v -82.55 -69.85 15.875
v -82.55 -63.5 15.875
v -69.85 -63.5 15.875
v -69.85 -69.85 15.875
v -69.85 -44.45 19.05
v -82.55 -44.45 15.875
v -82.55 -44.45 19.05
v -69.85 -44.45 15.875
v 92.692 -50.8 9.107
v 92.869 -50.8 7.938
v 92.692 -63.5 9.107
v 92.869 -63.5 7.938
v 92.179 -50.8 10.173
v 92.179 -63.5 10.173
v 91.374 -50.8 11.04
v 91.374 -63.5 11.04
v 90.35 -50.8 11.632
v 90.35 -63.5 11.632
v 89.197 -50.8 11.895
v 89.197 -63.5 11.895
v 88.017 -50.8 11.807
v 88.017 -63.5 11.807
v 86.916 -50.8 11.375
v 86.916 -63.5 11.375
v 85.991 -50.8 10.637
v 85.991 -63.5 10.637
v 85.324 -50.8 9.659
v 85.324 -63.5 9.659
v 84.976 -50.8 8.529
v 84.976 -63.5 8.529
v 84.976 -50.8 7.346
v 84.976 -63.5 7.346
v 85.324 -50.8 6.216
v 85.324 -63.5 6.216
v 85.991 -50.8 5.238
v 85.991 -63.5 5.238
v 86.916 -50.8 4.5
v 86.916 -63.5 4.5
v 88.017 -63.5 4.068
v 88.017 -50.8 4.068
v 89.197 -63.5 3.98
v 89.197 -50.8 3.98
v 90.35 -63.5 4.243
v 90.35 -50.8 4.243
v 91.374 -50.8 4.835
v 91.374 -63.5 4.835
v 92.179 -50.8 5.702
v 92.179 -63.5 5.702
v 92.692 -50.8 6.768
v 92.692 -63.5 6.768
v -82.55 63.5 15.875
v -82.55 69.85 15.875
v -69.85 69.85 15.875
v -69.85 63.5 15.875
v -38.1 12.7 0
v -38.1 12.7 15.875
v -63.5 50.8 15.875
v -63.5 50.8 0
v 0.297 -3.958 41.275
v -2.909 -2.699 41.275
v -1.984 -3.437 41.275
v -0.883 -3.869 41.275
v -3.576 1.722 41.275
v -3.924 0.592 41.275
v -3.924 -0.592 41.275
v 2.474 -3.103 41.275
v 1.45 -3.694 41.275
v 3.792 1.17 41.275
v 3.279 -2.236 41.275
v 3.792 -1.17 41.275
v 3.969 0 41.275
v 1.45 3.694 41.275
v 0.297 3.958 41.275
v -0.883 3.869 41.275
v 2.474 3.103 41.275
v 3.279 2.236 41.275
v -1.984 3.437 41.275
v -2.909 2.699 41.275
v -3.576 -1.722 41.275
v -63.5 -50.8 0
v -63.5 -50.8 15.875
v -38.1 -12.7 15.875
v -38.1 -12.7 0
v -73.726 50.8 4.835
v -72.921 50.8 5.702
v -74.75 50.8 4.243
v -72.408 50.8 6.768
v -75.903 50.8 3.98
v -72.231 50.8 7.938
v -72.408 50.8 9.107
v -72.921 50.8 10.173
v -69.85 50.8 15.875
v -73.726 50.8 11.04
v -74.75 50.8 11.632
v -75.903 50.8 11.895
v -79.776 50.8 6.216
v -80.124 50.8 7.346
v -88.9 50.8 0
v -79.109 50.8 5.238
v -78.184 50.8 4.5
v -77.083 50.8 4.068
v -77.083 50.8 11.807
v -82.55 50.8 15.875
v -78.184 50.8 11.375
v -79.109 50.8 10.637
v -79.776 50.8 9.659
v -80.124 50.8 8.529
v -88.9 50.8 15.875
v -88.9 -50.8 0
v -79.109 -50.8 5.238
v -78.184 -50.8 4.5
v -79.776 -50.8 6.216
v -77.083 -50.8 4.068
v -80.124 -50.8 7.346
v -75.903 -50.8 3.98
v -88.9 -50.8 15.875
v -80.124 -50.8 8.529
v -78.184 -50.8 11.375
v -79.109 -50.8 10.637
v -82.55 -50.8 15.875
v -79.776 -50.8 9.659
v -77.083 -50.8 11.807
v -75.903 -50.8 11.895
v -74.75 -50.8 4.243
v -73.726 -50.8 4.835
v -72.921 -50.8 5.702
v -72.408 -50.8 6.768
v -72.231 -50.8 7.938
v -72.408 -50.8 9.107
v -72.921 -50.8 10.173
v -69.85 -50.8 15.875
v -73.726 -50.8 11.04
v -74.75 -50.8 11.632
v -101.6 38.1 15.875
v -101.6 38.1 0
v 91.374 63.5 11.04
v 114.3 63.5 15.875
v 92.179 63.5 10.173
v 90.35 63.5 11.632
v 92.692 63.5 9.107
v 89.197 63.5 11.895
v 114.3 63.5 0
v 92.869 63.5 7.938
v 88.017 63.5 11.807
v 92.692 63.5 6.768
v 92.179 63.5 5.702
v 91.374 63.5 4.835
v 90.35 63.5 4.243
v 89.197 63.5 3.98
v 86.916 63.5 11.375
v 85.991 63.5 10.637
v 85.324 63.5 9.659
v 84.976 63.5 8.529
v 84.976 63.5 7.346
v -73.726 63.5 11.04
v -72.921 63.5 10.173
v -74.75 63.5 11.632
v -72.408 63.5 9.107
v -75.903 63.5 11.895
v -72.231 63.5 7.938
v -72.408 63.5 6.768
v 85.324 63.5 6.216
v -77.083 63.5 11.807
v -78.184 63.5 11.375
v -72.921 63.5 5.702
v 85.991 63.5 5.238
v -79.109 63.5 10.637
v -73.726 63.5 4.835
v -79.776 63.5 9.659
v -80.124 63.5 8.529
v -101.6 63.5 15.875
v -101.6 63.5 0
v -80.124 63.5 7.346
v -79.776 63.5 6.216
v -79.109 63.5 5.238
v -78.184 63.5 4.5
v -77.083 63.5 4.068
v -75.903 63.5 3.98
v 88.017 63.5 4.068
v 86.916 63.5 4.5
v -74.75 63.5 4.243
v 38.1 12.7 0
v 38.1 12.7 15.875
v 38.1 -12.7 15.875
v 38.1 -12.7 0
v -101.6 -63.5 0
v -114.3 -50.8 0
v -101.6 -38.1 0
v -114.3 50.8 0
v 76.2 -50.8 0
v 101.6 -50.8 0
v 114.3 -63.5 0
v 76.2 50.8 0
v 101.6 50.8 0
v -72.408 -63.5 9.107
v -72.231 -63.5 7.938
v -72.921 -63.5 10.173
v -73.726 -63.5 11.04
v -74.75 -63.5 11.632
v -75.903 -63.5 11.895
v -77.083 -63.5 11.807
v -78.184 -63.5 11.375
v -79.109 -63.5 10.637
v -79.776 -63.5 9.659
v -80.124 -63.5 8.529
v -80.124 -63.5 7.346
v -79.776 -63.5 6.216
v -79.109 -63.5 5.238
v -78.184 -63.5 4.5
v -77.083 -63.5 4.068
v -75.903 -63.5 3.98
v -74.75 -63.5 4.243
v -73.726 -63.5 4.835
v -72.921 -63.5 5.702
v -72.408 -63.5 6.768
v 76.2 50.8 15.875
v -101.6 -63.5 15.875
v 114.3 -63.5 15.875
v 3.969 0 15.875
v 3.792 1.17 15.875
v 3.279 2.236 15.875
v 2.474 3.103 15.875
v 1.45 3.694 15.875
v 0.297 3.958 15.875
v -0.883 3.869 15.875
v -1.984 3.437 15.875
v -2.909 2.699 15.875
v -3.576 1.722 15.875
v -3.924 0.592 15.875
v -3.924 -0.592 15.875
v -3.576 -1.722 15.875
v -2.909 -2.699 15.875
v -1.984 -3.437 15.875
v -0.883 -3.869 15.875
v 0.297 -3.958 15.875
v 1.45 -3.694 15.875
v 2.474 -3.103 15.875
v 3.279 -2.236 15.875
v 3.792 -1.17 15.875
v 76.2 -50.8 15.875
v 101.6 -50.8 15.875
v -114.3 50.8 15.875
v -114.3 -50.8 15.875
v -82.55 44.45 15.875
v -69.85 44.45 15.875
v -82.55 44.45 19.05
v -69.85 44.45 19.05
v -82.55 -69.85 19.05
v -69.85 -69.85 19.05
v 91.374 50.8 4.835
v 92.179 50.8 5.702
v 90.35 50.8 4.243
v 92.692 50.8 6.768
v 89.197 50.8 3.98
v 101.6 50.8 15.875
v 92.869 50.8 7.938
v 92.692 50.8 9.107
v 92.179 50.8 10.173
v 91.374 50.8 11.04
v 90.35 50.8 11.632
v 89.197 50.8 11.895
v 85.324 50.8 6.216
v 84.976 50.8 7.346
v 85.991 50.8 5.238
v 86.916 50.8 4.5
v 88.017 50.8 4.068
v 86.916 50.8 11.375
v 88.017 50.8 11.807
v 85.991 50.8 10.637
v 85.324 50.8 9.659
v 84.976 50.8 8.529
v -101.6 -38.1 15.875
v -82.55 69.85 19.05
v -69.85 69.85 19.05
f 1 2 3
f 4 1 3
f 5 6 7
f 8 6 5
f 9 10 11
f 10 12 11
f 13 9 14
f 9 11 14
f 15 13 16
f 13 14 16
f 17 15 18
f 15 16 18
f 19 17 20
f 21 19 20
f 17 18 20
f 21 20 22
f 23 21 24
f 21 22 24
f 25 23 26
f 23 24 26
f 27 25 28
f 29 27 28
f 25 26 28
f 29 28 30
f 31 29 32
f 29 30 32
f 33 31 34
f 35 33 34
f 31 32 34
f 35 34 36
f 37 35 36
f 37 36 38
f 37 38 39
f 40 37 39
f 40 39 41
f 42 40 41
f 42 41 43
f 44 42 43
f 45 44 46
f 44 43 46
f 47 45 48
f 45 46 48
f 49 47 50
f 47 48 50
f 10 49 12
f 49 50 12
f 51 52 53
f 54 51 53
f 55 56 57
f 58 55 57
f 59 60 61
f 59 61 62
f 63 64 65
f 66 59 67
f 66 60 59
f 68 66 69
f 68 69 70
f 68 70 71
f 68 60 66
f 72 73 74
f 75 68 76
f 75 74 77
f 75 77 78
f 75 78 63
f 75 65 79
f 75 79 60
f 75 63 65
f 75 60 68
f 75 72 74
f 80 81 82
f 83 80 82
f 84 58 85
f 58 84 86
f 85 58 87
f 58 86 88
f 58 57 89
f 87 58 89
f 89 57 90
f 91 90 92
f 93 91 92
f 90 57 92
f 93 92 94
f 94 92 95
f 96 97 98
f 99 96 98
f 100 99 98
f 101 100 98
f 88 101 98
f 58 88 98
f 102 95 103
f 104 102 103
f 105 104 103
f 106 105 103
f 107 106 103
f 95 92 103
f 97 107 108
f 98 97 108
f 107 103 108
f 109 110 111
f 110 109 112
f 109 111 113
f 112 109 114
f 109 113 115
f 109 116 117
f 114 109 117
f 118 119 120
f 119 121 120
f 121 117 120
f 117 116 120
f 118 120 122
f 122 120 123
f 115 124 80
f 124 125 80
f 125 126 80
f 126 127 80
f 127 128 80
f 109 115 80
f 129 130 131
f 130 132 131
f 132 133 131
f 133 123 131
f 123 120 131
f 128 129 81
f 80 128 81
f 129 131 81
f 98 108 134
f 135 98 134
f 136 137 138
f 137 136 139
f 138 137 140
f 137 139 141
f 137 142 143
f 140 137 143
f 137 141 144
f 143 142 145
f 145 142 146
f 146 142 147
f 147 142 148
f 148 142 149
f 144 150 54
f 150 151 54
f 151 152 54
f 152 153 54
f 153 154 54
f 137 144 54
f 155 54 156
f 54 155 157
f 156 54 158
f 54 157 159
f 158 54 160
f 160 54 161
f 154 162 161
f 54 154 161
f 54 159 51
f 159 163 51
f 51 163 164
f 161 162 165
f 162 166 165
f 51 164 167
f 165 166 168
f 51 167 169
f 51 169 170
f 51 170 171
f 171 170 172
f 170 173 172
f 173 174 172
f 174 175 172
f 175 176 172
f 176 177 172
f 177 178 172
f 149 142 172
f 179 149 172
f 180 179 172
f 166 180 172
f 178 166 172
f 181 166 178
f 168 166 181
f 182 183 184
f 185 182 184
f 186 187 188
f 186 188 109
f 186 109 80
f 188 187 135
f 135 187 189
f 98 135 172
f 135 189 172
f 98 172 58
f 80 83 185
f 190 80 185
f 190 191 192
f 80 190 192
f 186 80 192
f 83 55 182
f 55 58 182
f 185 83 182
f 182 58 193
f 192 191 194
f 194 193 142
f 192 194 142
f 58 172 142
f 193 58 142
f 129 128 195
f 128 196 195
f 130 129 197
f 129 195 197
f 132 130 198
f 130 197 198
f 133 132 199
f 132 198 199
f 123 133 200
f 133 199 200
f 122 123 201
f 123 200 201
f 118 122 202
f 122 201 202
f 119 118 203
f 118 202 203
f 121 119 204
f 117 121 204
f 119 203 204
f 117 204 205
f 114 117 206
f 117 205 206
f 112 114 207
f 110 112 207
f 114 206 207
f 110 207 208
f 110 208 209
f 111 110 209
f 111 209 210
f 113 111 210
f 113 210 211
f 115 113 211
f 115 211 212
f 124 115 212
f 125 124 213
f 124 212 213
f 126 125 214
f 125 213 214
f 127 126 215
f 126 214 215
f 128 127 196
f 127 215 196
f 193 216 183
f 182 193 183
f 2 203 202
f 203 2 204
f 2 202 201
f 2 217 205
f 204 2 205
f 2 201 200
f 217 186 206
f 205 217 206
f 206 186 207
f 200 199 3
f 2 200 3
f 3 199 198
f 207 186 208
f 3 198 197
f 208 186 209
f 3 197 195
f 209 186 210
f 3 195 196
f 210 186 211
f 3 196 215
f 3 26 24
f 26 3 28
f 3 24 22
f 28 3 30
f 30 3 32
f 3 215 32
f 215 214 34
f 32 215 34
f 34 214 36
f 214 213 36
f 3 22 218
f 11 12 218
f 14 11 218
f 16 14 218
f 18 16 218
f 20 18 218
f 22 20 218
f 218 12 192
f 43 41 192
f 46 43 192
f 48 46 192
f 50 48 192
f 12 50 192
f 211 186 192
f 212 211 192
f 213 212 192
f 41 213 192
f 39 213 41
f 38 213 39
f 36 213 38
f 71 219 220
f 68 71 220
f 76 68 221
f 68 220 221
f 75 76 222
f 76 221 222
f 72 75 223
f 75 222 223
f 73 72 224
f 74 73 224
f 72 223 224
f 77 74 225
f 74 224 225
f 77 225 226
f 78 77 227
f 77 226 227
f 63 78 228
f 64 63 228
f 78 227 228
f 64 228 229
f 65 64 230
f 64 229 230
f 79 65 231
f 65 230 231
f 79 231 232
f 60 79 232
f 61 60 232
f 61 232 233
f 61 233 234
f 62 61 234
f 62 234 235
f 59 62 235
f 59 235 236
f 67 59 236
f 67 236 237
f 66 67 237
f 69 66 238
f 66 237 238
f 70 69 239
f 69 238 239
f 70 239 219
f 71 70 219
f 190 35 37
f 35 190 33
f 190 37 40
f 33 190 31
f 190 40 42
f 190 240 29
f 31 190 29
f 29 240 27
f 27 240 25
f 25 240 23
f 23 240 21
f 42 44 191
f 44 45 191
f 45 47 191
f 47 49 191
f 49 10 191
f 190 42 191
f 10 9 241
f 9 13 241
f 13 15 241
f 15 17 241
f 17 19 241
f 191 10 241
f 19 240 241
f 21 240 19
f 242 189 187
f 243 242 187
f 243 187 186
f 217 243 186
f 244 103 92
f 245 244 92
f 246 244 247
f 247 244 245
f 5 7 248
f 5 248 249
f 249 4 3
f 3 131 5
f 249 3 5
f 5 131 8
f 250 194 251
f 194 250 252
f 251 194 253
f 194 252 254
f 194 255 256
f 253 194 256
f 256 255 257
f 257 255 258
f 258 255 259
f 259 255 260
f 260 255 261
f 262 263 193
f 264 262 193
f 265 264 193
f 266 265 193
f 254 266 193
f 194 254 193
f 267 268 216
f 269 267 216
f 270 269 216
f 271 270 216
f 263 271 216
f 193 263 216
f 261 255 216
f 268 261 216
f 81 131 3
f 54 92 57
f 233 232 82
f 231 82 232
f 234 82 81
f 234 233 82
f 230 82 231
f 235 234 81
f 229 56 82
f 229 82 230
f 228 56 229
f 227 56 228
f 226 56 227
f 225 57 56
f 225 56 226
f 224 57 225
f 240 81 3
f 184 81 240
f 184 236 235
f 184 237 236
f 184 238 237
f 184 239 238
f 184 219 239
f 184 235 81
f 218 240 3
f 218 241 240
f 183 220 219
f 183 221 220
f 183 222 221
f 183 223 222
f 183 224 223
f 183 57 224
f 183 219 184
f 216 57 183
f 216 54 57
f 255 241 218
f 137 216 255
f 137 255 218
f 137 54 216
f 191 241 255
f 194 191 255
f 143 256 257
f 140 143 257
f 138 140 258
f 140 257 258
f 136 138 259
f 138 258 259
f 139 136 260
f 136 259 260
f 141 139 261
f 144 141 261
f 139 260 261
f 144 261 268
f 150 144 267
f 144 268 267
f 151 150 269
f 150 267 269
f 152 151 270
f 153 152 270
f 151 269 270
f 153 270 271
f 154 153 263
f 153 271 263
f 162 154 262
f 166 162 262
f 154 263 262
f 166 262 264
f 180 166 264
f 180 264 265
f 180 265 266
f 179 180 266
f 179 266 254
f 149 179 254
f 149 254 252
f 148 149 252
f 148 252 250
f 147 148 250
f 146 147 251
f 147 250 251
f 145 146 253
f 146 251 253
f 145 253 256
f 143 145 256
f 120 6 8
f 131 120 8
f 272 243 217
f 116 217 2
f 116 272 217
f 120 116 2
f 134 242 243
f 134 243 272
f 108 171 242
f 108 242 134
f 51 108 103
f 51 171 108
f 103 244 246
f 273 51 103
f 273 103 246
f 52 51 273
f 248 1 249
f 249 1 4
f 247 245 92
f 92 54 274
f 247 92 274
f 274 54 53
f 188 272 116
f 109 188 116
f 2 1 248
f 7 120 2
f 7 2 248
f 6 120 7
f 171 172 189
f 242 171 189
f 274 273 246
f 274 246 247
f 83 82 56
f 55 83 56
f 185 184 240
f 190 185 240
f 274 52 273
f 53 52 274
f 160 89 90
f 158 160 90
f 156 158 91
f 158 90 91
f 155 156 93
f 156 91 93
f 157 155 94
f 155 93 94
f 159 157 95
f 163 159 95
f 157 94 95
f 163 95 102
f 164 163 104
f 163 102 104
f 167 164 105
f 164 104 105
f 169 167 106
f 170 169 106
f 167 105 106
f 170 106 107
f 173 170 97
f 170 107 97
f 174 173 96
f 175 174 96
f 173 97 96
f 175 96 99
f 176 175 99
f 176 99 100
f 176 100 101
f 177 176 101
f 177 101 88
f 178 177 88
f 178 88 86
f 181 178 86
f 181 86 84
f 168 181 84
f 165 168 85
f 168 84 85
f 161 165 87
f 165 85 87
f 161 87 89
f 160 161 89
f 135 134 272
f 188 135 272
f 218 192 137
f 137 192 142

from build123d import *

# Parameters (mm, degrees)
F1_DEPTH  = 15.875
F2_R      = 3.96875
F3_DEPTH  = 127
F5_DEPTH  = 15.876
F7_DEPTH  = 25.4
F8_R      = 3.96875
F9_DEPTH  = 25.4
F10_W     = 12.7
F10_H     = 25.4
F11_DEPTH = 3.175


with BuildPart() as f1:
    # F0 (on Top) → F1 (new body)
    with BuildSketch(Plane.XY):
        Polygon((-101.6, 63.5), (-114.3, 50.8), (-114.3, -50.8), (-101.6, -63.5), (114.3, -63.5), (114.3, 63.5), align=None)
    extrude(amount=F1_DEPTH)

    # F2 (on Front) → F3 (cut, symmetric)
    with BuildSketch(Plane.XZ):
        with Locations((-76.2, 7.9375)):
            Circle(F2_R)
        with Locations((88.9, 7.9375)):
            Circle(F2_R)
    extrude(amount=F3_DEPTH, both=True, mode=Mode.SUBTRACT)

    # F4 (on face) → F5 (cut, through all)
    with BuildSketch(Plane.XY.offset(15.875)):
        Polygon((76.2, 50.8), (38.1, 12.7), (38.1, -12.7), (76.2, -50.8), (101.6, -50.8), (101.6, 50.8), align=None)
    extrude(amount=-F5_DEPTH, mode=Mode.SUBTRACT)

    # F6 (on face) → F7 (cut)
    with BuildSketch(Plane.XY.offset(15.875)):
        Polygon((-38.1, -12.7), (-38.1, 12.7), (-63.5, 50.8), (-88.9, 50.8), (-101.6, 38.1), (-101.6, -38.1), (-88.9, -50.8), (-63.5, -50.8), align=None)
    extrude(amount=-F7_DEPTH, mode=Mode.SUBTRACT)

    # F8 (on face) → F9 (join)
    with BuildSketch(Plane.XY.offset(15.875)):
        Circle(F8_R)
    extrude(amount=F9_DEPTH)

    # F10 (on face) → F11 (join)
    with BuildSketch(Plane.XY.offset(15.875)):
        with Locations((-76.2, 57.15)):
            Rectangle(F10_W, F10_H)
        with Locations((-76.2, -57.15)):
            Rectangle(F10_W, F10_H)
    extrude(amount=F11_DEPTH)


solid = f1.part
